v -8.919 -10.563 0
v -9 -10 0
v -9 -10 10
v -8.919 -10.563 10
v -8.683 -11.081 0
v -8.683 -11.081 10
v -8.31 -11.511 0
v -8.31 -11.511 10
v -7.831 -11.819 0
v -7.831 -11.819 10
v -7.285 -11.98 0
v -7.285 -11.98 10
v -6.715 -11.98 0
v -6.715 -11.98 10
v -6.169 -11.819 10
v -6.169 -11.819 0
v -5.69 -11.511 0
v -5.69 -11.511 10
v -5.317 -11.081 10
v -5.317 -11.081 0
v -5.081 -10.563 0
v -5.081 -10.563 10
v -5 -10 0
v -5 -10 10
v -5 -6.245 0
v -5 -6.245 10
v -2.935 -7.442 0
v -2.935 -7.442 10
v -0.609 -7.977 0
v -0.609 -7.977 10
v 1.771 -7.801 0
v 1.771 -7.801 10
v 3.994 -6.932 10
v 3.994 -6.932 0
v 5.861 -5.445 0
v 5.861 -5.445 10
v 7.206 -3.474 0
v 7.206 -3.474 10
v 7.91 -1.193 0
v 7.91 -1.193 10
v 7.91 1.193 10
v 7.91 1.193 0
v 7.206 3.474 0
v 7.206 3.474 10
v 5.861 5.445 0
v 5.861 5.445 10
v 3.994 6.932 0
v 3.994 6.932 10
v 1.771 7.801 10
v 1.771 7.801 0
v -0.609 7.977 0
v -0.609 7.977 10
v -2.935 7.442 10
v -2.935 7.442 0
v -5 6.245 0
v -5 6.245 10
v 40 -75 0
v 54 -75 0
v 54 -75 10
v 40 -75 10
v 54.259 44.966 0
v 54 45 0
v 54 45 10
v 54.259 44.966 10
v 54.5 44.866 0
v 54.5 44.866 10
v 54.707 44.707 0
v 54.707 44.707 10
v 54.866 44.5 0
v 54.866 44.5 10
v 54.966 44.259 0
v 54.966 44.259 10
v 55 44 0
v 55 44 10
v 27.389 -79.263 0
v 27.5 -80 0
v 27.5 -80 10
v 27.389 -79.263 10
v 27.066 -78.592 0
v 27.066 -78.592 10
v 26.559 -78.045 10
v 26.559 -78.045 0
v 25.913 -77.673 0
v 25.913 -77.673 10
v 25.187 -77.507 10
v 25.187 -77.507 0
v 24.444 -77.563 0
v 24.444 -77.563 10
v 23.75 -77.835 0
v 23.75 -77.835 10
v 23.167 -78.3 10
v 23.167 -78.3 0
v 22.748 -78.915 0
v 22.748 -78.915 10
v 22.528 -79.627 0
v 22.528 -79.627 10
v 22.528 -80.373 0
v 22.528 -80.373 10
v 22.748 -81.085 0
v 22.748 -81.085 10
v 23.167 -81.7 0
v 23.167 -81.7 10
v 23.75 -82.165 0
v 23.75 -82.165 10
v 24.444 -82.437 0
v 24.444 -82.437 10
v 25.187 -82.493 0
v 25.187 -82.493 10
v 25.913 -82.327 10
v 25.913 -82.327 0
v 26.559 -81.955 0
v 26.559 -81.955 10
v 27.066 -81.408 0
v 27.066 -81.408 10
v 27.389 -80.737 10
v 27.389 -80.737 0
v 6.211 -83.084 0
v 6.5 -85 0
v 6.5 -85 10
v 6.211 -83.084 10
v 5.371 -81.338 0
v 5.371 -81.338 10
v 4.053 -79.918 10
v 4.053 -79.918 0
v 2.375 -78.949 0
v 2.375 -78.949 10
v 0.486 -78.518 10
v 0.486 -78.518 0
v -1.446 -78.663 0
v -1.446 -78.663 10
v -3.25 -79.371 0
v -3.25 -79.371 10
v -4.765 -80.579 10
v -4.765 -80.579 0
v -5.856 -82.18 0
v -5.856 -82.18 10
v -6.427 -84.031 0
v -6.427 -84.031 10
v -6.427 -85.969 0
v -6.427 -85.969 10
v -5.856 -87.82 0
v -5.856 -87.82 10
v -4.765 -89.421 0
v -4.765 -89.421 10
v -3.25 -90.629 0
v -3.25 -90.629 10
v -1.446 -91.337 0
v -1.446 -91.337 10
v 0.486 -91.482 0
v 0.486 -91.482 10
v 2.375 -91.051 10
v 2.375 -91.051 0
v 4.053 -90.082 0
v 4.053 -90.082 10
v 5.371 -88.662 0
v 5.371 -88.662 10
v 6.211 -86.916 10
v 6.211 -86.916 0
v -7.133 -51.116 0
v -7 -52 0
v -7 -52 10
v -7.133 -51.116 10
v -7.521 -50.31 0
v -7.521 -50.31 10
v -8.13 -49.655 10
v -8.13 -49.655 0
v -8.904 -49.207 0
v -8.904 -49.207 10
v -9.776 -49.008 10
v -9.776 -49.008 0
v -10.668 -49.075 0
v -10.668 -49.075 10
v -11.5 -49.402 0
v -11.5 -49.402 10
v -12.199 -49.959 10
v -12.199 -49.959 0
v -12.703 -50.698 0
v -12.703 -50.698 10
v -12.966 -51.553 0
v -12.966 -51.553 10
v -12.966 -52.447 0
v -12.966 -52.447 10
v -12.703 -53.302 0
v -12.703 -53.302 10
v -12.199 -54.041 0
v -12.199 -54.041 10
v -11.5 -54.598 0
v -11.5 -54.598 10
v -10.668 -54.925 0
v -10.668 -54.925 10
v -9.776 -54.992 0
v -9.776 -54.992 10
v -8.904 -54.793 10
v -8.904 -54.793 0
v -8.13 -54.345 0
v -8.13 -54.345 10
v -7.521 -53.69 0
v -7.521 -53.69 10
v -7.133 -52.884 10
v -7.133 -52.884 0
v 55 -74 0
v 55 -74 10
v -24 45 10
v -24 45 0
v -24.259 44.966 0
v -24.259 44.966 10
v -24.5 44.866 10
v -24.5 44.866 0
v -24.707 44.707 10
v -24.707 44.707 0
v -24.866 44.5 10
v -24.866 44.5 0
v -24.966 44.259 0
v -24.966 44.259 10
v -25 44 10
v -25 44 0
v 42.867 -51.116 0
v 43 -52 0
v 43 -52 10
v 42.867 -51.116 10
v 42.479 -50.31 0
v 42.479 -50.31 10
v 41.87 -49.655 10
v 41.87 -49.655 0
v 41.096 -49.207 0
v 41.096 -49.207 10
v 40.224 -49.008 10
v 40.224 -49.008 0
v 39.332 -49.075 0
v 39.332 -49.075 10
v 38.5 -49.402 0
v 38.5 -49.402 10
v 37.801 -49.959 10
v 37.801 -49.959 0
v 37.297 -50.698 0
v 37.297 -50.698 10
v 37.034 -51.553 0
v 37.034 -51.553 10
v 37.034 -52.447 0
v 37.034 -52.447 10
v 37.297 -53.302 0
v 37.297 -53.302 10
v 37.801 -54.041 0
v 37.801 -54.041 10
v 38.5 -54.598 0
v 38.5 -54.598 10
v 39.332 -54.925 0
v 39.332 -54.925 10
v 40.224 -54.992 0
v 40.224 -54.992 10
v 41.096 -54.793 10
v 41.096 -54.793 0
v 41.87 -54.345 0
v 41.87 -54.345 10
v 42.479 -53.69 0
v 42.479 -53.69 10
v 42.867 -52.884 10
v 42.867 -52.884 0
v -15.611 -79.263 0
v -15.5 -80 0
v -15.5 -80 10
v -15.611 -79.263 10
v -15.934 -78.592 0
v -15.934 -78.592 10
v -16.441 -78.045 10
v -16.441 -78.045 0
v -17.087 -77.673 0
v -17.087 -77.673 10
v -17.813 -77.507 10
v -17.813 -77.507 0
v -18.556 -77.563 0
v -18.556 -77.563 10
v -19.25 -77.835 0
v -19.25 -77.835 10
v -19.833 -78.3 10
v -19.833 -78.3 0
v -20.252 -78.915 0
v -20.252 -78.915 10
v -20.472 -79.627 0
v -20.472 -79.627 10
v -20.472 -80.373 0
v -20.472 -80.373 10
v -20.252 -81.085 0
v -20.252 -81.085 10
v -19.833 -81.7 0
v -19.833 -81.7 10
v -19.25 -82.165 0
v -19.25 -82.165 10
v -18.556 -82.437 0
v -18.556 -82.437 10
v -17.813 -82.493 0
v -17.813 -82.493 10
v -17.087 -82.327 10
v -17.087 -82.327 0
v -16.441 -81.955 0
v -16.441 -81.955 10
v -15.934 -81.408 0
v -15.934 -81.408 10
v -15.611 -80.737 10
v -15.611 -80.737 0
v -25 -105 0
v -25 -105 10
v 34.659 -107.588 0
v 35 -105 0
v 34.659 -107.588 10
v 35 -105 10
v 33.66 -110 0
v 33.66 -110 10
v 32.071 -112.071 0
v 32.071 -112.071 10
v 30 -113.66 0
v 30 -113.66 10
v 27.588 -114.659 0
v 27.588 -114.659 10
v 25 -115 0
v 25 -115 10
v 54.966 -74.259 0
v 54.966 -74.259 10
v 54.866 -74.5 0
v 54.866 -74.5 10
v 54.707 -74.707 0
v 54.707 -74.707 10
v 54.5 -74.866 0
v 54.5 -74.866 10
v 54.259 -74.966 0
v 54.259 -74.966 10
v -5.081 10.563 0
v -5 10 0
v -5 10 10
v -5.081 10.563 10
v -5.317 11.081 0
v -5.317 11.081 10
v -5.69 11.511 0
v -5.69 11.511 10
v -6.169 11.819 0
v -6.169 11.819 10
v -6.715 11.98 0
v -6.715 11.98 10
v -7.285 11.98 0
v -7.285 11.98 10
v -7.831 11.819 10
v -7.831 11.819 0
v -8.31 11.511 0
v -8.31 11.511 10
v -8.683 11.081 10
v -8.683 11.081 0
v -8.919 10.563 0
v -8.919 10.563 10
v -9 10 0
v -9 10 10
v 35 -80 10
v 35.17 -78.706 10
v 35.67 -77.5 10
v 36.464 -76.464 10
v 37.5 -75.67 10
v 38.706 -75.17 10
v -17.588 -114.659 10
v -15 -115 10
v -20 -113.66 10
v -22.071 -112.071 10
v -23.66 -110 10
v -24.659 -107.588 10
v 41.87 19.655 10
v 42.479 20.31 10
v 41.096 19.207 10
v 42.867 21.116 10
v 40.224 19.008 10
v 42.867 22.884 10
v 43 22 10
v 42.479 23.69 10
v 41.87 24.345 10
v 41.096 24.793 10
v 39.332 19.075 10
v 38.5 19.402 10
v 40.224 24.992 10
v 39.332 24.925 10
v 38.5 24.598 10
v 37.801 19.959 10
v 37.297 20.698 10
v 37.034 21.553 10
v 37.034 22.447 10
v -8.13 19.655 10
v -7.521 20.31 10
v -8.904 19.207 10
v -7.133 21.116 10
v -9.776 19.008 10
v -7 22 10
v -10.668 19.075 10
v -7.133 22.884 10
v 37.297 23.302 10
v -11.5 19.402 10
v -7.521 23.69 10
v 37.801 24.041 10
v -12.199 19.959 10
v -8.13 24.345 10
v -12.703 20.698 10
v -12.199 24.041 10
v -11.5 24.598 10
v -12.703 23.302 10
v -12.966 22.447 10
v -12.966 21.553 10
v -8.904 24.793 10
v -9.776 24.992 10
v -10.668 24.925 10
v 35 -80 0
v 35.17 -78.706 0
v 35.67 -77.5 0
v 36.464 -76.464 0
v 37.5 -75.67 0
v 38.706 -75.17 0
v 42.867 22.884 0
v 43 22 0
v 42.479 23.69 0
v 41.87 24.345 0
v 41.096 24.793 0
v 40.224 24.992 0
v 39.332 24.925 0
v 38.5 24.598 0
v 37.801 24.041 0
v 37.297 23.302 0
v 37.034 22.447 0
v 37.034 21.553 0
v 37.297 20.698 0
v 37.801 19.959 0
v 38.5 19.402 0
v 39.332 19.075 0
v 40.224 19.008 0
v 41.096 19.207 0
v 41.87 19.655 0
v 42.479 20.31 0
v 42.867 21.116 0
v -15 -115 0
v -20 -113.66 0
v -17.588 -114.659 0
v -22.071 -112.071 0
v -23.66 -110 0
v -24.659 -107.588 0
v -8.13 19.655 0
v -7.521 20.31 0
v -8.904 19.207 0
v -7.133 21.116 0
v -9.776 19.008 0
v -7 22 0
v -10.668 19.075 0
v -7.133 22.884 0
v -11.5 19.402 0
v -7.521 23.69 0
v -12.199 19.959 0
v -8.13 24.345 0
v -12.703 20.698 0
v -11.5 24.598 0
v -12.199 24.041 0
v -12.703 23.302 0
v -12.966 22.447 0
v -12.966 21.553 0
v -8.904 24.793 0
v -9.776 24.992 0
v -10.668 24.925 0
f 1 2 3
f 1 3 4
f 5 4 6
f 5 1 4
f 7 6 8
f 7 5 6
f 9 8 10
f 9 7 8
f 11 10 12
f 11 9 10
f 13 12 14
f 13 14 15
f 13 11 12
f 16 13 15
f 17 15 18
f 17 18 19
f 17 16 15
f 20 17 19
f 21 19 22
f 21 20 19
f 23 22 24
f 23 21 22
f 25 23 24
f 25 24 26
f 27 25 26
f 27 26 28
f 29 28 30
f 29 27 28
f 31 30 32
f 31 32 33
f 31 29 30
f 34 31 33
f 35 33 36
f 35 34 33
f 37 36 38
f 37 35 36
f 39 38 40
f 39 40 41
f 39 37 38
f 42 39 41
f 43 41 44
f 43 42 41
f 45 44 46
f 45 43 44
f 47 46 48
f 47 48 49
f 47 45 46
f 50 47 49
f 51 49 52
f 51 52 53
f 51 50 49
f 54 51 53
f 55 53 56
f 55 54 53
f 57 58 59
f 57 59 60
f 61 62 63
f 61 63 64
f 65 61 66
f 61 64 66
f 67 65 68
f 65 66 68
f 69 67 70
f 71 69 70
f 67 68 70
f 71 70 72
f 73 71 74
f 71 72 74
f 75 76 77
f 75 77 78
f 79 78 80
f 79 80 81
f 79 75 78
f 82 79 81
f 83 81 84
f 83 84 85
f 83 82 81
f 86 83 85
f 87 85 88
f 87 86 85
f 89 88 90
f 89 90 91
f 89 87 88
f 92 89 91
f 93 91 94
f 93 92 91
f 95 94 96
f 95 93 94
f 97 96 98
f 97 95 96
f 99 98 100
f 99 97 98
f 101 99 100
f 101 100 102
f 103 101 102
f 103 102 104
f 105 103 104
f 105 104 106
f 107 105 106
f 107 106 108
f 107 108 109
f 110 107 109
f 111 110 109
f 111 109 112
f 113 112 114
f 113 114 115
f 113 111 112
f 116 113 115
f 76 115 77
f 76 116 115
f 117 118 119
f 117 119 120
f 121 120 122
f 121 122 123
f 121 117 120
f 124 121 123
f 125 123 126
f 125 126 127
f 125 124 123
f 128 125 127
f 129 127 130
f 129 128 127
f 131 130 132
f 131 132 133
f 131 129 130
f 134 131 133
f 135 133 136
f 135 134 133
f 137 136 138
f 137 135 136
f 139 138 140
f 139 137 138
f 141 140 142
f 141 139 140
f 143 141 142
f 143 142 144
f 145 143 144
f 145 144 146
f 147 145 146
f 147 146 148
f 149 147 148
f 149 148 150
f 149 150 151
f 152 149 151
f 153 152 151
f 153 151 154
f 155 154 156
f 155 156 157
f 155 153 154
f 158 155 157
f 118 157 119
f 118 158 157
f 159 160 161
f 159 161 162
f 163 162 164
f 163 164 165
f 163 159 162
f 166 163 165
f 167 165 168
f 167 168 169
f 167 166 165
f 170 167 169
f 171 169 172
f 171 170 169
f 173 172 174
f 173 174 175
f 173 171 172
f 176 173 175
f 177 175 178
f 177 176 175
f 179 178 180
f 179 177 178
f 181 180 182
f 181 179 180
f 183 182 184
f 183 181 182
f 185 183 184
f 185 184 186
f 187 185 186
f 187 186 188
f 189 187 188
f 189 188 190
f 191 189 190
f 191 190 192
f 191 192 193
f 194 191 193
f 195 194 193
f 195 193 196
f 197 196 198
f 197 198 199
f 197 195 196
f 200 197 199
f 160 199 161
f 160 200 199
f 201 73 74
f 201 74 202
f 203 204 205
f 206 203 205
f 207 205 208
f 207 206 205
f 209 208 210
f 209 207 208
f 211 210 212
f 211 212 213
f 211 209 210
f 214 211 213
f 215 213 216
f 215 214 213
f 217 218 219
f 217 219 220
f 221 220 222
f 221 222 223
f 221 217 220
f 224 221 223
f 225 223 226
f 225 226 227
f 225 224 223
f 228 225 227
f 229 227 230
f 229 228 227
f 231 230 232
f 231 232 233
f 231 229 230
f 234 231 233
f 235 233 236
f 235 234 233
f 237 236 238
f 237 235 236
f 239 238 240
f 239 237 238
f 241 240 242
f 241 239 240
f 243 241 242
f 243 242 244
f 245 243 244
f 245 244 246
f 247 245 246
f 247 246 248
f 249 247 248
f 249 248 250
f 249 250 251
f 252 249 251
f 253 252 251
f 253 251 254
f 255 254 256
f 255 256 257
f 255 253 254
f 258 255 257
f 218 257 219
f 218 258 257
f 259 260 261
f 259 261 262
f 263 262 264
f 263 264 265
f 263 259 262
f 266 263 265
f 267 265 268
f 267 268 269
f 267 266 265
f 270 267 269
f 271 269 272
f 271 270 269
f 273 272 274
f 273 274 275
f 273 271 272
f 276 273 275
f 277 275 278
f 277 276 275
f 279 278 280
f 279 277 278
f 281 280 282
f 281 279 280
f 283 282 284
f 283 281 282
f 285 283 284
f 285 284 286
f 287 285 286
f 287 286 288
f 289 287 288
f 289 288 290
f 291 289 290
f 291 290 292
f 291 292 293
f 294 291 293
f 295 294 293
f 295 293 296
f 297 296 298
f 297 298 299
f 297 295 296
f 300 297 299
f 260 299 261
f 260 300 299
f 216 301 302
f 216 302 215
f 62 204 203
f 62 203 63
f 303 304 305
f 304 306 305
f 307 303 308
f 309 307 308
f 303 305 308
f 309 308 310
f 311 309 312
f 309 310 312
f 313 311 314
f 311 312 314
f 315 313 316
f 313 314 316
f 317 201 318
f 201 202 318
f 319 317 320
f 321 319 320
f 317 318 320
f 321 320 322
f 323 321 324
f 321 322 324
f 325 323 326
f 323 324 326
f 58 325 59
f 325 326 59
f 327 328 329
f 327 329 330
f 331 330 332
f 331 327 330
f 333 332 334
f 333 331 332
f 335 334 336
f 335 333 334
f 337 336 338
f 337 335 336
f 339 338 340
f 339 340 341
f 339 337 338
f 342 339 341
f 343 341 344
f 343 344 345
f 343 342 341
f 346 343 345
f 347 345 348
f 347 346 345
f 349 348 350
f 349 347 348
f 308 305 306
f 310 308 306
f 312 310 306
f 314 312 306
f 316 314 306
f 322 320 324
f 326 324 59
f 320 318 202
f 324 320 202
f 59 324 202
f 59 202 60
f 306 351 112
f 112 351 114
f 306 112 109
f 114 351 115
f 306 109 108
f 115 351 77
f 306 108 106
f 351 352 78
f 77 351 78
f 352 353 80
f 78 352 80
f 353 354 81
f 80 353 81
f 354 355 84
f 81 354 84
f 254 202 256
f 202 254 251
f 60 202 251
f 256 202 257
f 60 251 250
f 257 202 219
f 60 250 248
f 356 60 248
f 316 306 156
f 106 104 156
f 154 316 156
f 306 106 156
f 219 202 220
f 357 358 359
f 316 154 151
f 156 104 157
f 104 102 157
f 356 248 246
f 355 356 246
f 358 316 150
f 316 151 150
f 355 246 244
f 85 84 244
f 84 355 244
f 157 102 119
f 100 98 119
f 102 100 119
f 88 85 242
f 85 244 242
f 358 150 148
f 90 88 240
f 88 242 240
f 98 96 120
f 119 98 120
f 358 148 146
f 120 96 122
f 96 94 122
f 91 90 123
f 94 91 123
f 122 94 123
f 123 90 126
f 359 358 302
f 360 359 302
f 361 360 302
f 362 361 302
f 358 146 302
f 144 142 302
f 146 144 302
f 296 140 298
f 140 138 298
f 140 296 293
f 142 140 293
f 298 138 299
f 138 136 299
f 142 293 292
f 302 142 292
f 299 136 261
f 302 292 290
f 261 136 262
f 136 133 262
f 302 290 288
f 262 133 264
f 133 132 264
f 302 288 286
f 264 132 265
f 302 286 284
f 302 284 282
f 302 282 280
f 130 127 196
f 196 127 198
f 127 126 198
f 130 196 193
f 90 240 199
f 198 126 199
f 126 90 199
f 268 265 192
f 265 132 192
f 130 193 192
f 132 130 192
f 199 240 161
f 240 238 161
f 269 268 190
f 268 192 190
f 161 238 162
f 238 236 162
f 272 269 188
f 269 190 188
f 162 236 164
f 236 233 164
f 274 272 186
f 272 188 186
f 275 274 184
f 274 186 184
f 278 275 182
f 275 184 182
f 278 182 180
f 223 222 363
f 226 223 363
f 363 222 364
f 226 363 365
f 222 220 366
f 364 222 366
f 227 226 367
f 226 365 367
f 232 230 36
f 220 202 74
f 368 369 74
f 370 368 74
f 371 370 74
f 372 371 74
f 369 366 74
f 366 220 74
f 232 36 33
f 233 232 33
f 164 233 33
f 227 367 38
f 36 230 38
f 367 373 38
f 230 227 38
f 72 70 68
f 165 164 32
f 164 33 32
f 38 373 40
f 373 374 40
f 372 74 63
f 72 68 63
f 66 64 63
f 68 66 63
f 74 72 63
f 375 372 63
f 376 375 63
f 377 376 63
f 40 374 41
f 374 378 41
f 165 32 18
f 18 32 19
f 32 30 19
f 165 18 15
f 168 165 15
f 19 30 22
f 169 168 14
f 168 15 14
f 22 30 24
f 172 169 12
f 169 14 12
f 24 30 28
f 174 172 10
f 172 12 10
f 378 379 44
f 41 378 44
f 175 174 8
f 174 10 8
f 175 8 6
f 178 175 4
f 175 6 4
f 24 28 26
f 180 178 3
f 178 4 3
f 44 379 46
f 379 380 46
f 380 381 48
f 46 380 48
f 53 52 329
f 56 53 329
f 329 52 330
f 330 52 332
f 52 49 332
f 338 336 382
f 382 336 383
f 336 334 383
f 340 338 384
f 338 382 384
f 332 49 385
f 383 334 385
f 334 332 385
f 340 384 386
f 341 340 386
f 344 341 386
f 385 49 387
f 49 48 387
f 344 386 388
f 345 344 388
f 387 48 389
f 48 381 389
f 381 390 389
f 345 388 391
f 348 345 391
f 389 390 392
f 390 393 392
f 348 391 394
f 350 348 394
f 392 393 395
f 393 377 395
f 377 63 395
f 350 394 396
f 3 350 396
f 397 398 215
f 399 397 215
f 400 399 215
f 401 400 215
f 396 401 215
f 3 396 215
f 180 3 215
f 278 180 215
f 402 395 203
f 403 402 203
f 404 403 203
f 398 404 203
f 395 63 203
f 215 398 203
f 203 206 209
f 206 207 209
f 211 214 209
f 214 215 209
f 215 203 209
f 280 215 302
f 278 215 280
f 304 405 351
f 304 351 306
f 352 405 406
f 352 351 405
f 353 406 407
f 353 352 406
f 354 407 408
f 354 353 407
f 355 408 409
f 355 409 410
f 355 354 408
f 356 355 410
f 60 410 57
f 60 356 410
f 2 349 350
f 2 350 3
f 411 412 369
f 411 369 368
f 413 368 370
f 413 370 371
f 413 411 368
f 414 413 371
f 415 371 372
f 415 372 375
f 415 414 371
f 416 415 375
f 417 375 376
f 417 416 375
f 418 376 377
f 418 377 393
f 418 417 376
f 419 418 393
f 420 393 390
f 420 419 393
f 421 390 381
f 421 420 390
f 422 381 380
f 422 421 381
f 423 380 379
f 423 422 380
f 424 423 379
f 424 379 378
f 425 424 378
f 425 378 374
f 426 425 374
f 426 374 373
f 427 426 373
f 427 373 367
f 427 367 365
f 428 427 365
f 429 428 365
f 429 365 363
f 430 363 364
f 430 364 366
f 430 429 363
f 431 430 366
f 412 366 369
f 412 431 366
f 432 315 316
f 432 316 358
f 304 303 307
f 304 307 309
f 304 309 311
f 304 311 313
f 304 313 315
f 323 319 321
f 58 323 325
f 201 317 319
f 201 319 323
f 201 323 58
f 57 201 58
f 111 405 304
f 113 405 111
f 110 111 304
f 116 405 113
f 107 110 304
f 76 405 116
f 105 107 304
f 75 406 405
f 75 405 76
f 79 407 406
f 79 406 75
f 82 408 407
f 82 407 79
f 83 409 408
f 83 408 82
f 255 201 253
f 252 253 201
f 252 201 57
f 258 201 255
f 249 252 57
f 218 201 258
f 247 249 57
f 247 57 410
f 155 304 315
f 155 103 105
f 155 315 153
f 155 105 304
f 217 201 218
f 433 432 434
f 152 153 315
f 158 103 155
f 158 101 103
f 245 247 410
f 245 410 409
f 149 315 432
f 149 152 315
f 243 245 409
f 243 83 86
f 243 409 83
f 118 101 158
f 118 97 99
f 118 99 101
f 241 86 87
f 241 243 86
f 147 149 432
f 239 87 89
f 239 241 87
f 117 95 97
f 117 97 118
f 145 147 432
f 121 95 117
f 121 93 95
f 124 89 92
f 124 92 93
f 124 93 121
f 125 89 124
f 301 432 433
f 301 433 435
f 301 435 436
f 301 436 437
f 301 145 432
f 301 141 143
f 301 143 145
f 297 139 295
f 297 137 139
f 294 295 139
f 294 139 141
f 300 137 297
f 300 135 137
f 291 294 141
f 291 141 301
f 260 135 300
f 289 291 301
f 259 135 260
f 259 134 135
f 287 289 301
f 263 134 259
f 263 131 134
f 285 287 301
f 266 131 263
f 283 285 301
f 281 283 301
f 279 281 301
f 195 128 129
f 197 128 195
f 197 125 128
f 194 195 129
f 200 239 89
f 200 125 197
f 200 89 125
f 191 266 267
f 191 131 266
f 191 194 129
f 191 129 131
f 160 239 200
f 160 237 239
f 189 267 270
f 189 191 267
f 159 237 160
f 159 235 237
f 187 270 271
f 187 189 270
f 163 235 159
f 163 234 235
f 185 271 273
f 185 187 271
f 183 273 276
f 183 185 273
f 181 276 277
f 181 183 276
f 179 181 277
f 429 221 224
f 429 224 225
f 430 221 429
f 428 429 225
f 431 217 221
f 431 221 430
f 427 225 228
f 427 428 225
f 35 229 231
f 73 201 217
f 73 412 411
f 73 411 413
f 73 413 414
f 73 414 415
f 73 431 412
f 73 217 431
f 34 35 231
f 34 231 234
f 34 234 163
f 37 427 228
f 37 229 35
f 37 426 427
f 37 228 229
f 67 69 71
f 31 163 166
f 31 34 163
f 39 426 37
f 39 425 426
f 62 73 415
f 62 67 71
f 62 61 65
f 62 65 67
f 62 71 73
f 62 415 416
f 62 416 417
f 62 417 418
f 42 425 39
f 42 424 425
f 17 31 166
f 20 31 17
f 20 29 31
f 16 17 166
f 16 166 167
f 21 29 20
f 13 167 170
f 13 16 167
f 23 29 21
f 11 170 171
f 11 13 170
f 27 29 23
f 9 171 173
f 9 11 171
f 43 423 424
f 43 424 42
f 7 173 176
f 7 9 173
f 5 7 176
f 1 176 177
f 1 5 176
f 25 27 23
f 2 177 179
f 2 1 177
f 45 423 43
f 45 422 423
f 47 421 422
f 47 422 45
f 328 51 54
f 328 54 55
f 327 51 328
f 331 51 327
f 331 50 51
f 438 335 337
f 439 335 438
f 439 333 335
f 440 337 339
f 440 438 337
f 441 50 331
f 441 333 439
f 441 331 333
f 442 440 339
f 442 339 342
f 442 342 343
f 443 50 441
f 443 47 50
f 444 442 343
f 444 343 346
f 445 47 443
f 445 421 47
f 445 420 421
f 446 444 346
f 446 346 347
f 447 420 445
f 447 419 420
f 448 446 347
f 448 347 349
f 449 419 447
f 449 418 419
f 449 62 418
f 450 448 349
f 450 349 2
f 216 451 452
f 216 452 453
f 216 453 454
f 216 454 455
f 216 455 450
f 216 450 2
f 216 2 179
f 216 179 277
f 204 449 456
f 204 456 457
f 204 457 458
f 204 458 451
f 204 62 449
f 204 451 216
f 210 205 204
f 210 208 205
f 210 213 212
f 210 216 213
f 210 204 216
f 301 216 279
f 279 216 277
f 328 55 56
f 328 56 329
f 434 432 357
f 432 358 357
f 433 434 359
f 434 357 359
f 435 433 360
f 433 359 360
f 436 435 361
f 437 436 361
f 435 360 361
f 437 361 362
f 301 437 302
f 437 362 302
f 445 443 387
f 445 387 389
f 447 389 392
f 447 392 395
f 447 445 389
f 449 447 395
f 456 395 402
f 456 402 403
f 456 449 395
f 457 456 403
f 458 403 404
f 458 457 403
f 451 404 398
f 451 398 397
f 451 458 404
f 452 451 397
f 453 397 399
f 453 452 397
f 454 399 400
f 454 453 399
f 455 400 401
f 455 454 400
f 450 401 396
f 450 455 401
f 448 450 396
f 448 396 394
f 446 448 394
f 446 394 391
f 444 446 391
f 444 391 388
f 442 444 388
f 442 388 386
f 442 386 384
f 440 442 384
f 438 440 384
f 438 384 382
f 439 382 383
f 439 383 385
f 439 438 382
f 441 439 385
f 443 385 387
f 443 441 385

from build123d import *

# Parameters (mm, degrees)
SKETCH_R    = 6.5
SKETCH_R_2  = 3
SKETCH_R_3  = 2.5
PAD_DEPTH   = 10
FILLET_R    = 1
FILLET001_R = 5
FILLET002_R = 10


with BuildPart() as part:
    # Sketch → Pad (new body)
    with BuildSketch(Plane.XY):
        Polygon((-25, 45), (55, 45), (55, -75), (35, -75), (35, -115), (-25, -115), align=None)
        with Locations((0, -85)):
            Circle(SKETCH_R, mode=Mode.SUBTRACT)
        with Locations((-10, -52)):
            Circle(SKETCH_R_2, mode=Mode.SUBTRACT)
        with Locations((40, -52)):
            Circle(SKETCH_R_2, mode=Mode.SUBTRACT)
        with Locations((40, 22)):
            Circle(SKETCH_R_2, mode=Mode.SUBTRACT)
        with Locations((-10, 22)):
            Circle(SKETCH_R_2, mode=Mode.SUBTRACT)
        with Locations((25, -80)):
            Circle(SKETCH_R_3, mode=Mode.SUBTRACT)
        with Locations((-18, -80)):
            Circle(SKETCH_R_3, mode=Mode.SUBTRACT)
        with BuildLine():
            ThreePointArc((-5, -6.244998), (8, 0), (-5, 6.244998))
            Line((-5, 6.244998), (-5, 10))
            ThreePointArc((-5, 10), (-7, 12), (-9, 10))
            Line((-9, 10), (-9, -10))
            ThreePointArc((-9, -10), (-7, -12), (-5, -10))
            Line((-5, -10), (-5, -6.244998))
        make_face(mode=Mode.SUBTRACT)
    extrude(amount=PAD_DEPTH)

    # Fillet
    fillet_edges = [part.edges().sort_by_distance(p)[0] for p in [
        (55, -75, 5),
        (55, 45, 5),
        (-25, 45, 5),
    ]]
    fillet(fillet_edges, radius=FILLET_R)

    # Fillet001
    fillet001_edges = [part.edges().sort_by_distance(p)[0] for p in [
        (35, -75, 5),
    ]]
    fillet(fillet001_edges, radius=FILLET001_R)

    # Fillet002
    fillet002_edges = [part.edges().sort_by_distance(p)[0] for p in [
        (35, -115, 5),
        (-25, -115, 5),
    ]]
    fillet(fillet002_edges, radius=FILLET002_R)


solid = part.part
